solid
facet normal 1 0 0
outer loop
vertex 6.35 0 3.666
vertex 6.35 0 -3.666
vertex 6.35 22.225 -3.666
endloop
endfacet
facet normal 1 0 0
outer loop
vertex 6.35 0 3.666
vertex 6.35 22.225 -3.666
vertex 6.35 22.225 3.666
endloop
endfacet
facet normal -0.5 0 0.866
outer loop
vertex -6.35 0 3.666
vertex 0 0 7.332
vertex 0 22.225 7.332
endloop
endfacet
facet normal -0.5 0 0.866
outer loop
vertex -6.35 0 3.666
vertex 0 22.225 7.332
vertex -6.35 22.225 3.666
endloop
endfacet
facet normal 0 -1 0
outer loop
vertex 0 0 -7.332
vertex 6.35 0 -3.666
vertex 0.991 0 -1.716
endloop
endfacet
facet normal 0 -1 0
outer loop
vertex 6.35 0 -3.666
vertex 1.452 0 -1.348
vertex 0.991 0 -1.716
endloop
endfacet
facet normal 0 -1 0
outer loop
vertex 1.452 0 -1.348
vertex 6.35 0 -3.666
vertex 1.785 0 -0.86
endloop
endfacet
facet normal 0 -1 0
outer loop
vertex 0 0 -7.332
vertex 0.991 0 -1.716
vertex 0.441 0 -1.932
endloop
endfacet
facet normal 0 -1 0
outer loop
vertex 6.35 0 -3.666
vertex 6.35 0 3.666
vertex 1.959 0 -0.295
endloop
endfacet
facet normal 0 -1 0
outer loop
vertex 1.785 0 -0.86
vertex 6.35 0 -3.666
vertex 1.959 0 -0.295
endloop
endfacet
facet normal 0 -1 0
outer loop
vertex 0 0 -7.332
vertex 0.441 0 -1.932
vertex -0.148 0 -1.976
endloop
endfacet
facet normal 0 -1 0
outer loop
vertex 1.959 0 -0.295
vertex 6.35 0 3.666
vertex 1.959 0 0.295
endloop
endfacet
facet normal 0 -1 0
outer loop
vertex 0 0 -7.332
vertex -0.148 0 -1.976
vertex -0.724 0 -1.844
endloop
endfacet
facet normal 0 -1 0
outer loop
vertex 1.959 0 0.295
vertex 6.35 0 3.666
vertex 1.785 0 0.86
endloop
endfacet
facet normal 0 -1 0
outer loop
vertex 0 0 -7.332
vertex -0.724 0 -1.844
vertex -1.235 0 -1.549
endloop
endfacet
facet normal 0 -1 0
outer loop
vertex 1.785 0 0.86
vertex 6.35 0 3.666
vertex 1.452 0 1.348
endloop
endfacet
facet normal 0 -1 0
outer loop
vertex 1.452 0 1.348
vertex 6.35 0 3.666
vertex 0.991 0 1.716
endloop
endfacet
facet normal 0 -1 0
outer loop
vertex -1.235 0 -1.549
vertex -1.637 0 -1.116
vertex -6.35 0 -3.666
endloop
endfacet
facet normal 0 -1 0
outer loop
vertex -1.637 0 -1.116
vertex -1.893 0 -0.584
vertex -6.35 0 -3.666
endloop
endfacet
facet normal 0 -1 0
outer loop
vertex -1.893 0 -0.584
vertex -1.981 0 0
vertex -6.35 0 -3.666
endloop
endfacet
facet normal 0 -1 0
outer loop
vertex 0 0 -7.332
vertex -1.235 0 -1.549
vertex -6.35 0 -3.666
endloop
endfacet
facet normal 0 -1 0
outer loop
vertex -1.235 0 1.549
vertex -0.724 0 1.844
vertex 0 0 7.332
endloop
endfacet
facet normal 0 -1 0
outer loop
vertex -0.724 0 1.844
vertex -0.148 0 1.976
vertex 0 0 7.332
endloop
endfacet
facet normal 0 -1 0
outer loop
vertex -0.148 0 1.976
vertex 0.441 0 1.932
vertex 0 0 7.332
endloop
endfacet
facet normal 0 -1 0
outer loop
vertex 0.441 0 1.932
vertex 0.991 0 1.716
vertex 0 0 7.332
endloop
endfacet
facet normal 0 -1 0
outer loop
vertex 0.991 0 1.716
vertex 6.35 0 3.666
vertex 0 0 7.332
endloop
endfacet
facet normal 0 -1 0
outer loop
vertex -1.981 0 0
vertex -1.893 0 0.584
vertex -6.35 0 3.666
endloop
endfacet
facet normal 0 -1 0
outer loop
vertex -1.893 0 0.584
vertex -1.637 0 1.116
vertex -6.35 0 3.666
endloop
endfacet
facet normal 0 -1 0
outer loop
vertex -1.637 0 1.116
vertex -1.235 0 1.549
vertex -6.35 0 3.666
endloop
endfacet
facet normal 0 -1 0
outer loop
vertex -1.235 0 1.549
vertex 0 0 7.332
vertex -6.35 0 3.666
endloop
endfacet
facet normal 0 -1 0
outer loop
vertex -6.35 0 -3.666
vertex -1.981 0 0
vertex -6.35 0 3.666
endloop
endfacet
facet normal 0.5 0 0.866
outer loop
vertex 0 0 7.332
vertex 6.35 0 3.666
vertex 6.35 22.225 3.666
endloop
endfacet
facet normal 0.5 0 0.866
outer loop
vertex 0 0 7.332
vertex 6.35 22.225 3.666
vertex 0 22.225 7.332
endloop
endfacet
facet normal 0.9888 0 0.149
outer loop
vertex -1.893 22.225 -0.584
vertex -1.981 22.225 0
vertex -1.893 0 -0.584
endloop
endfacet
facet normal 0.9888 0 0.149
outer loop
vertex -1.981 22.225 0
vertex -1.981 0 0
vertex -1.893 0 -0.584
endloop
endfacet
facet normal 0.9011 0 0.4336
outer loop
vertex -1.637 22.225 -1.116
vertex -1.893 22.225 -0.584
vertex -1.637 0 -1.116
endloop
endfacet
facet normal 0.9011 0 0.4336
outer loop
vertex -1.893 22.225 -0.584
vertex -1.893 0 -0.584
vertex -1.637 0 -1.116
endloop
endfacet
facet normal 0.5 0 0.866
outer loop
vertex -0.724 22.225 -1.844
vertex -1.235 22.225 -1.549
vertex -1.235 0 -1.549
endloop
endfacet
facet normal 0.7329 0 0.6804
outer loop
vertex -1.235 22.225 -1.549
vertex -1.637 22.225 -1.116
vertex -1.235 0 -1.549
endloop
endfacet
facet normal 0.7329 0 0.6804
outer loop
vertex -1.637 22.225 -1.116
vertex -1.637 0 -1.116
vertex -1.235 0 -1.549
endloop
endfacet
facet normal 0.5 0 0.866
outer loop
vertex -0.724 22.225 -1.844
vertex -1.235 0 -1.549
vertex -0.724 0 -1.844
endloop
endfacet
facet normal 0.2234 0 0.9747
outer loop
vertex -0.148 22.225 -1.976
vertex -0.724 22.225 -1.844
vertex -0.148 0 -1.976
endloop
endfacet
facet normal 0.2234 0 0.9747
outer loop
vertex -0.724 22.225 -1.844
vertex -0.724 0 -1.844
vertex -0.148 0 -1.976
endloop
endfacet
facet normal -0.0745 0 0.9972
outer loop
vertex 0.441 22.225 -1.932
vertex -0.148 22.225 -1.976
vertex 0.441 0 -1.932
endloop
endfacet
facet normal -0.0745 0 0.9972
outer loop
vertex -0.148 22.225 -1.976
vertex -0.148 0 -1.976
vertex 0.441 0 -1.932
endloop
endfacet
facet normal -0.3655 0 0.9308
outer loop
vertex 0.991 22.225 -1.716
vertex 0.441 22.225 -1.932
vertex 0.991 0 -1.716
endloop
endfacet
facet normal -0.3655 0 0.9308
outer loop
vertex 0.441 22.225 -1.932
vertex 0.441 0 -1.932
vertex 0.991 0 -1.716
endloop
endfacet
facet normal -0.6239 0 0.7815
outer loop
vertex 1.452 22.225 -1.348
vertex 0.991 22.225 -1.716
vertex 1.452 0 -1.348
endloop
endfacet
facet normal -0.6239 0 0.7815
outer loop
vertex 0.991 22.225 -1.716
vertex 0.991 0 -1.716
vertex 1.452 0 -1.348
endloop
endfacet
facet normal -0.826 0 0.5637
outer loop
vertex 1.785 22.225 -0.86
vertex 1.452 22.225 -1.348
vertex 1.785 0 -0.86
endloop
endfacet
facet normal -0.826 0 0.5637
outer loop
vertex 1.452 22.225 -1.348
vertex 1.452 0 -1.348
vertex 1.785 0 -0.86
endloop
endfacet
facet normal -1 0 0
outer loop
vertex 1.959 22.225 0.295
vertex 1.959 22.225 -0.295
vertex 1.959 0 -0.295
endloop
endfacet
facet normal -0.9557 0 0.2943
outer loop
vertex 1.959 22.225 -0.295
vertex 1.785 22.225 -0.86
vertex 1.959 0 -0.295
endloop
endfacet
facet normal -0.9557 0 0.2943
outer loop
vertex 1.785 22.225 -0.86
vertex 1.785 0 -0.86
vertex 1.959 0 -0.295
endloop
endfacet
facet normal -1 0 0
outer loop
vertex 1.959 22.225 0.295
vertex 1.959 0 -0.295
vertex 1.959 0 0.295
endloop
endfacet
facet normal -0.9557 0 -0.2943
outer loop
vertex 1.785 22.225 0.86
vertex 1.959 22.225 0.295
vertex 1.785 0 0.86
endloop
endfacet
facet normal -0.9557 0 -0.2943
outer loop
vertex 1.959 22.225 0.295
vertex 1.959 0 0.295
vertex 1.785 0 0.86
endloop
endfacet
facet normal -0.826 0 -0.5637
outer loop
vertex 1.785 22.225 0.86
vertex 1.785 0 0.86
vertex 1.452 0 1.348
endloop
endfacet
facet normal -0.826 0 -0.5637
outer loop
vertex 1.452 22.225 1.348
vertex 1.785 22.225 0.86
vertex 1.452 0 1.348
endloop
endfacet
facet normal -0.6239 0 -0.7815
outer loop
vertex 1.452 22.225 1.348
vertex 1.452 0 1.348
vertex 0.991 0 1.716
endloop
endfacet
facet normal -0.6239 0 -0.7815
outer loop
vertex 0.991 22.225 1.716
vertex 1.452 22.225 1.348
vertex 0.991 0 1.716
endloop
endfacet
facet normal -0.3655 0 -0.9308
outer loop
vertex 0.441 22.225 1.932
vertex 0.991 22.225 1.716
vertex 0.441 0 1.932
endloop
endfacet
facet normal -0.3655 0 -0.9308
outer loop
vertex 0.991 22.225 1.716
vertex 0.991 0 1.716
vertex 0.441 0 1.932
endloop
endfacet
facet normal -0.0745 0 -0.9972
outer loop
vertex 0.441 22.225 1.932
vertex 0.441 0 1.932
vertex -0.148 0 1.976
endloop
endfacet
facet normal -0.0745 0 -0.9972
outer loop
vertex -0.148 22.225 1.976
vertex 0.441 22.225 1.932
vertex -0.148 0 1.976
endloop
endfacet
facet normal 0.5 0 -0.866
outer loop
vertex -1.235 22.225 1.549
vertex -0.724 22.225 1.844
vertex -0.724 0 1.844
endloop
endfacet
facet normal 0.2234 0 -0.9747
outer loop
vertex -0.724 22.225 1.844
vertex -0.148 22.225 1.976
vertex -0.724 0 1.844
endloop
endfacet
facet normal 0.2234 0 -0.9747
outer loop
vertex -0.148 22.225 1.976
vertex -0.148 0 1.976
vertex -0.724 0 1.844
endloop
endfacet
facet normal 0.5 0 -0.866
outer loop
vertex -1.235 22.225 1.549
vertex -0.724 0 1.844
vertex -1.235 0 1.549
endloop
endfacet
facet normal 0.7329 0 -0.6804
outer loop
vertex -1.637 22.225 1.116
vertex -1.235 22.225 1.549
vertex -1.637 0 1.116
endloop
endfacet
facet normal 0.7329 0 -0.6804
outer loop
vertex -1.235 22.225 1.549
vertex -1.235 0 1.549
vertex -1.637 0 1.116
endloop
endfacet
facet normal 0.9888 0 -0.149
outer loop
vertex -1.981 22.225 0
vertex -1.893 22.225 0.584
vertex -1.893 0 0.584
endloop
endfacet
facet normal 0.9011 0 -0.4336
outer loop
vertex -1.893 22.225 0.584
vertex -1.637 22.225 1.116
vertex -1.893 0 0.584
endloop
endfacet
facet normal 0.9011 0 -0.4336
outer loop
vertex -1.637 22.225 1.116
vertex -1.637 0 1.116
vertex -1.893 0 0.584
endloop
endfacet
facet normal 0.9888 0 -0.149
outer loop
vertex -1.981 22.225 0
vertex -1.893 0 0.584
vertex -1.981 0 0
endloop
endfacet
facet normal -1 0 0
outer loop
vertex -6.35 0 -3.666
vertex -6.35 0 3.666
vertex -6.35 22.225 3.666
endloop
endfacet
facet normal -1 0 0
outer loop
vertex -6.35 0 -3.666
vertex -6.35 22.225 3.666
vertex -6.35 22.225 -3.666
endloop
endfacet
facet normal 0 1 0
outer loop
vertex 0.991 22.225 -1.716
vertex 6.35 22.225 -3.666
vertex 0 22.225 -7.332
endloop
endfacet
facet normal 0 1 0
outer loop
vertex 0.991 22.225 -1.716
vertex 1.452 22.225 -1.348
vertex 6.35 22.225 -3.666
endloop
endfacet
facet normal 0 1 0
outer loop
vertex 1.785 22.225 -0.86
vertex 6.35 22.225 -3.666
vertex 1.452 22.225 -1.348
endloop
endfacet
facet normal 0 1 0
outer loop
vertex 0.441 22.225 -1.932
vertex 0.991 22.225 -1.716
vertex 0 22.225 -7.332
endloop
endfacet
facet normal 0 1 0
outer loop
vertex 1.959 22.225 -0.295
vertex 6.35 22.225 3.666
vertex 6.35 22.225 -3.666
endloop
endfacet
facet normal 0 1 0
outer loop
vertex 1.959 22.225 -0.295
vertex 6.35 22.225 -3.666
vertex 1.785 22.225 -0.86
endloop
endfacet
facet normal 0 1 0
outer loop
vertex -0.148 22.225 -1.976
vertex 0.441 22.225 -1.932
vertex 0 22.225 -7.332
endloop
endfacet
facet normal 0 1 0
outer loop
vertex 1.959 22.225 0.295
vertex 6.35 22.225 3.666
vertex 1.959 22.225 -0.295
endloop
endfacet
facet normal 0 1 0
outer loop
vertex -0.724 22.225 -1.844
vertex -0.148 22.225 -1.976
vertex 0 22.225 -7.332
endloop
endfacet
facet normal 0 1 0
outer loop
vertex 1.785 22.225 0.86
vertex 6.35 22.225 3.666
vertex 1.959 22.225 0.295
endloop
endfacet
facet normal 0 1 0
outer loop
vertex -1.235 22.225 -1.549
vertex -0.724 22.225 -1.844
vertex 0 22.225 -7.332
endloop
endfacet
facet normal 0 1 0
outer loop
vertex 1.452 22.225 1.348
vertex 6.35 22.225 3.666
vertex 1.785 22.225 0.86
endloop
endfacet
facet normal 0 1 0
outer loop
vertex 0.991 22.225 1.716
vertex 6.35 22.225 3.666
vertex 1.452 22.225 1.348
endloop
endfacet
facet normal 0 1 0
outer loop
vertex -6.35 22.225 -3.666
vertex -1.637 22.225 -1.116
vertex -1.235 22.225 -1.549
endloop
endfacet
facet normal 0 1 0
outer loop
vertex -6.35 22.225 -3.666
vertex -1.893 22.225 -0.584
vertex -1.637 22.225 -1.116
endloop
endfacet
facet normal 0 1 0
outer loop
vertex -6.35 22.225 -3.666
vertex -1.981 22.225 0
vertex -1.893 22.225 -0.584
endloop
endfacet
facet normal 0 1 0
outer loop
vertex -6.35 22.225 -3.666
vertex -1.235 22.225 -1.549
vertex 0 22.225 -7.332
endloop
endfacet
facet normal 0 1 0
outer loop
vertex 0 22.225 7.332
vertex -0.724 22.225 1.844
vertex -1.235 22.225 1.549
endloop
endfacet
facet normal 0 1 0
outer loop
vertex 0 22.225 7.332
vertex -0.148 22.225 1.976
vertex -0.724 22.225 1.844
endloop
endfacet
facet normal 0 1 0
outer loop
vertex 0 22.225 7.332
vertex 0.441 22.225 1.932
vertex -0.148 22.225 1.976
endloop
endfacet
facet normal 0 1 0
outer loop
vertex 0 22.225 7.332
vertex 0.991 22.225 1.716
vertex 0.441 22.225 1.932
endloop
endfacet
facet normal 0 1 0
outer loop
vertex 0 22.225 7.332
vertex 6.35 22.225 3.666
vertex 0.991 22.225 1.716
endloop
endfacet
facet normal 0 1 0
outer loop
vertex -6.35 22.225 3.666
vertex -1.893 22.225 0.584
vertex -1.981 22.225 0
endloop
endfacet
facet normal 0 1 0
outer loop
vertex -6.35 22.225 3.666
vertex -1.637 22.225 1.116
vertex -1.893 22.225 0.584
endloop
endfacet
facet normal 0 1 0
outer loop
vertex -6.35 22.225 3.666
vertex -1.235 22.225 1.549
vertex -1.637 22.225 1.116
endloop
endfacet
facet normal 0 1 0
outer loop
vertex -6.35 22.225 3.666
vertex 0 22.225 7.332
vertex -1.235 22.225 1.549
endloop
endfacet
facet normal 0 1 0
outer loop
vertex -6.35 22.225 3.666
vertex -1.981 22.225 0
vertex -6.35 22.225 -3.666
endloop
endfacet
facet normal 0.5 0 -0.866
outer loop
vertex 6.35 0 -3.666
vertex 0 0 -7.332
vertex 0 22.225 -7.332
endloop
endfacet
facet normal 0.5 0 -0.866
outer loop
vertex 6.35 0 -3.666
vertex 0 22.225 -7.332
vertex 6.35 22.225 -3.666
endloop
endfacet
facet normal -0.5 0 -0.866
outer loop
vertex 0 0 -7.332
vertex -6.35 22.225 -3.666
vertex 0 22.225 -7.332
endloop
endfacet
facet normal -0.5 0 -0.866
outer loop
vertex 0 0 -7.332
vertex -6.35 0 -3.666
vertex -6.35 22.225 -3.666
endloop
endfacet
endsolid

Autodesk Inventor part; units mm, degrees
ref_plane "YZ Plane" through (0, 0, 0) normal (1, 0, 0) x (0, 1, 0)
ref_plane "XZ Plane" through (0, 0, 0) normal (0, 1, 0) x (-1, 0, 0)
ref_plane "XY Plane" through (0, 0, 0) normal (0, 0, 1) x (1, 0, 0)
sketch "Sketch1" plane through (0, 0, 0) normal (0, 1, 0) x (-1, 0, 0)
  circle A0 centre (0, 0) radius 1.9812
  line L0 (6.35, 3.6662) -> (6.35, -3.6662)
  line L1 (6.35, -3.6662) -> (0, -7.3323)
  line L2 (0, -7.3323) -> (-6.35, -3.6662)
  line L3 (-6.35, -3.6662) -> (-6.35, 3.6662)
  line L4 (-6.35, 3.6662) -> (0, 7.3323)
  line L5 (0, 7.3323) -> (6.35, 3.6662)
  dimension "d0" = 3.9624
  dimension "d1" = 12.7
extrude "Extrusion1" add sketch "Sketch1" along normal blind 22.225
thread "Thread1" size "10-32 UNF" class "2B" standard "ANSI Unified Screw Threads" full length
properties part number "CLIM_007_HexHaft" material "Aluminum 6061"
